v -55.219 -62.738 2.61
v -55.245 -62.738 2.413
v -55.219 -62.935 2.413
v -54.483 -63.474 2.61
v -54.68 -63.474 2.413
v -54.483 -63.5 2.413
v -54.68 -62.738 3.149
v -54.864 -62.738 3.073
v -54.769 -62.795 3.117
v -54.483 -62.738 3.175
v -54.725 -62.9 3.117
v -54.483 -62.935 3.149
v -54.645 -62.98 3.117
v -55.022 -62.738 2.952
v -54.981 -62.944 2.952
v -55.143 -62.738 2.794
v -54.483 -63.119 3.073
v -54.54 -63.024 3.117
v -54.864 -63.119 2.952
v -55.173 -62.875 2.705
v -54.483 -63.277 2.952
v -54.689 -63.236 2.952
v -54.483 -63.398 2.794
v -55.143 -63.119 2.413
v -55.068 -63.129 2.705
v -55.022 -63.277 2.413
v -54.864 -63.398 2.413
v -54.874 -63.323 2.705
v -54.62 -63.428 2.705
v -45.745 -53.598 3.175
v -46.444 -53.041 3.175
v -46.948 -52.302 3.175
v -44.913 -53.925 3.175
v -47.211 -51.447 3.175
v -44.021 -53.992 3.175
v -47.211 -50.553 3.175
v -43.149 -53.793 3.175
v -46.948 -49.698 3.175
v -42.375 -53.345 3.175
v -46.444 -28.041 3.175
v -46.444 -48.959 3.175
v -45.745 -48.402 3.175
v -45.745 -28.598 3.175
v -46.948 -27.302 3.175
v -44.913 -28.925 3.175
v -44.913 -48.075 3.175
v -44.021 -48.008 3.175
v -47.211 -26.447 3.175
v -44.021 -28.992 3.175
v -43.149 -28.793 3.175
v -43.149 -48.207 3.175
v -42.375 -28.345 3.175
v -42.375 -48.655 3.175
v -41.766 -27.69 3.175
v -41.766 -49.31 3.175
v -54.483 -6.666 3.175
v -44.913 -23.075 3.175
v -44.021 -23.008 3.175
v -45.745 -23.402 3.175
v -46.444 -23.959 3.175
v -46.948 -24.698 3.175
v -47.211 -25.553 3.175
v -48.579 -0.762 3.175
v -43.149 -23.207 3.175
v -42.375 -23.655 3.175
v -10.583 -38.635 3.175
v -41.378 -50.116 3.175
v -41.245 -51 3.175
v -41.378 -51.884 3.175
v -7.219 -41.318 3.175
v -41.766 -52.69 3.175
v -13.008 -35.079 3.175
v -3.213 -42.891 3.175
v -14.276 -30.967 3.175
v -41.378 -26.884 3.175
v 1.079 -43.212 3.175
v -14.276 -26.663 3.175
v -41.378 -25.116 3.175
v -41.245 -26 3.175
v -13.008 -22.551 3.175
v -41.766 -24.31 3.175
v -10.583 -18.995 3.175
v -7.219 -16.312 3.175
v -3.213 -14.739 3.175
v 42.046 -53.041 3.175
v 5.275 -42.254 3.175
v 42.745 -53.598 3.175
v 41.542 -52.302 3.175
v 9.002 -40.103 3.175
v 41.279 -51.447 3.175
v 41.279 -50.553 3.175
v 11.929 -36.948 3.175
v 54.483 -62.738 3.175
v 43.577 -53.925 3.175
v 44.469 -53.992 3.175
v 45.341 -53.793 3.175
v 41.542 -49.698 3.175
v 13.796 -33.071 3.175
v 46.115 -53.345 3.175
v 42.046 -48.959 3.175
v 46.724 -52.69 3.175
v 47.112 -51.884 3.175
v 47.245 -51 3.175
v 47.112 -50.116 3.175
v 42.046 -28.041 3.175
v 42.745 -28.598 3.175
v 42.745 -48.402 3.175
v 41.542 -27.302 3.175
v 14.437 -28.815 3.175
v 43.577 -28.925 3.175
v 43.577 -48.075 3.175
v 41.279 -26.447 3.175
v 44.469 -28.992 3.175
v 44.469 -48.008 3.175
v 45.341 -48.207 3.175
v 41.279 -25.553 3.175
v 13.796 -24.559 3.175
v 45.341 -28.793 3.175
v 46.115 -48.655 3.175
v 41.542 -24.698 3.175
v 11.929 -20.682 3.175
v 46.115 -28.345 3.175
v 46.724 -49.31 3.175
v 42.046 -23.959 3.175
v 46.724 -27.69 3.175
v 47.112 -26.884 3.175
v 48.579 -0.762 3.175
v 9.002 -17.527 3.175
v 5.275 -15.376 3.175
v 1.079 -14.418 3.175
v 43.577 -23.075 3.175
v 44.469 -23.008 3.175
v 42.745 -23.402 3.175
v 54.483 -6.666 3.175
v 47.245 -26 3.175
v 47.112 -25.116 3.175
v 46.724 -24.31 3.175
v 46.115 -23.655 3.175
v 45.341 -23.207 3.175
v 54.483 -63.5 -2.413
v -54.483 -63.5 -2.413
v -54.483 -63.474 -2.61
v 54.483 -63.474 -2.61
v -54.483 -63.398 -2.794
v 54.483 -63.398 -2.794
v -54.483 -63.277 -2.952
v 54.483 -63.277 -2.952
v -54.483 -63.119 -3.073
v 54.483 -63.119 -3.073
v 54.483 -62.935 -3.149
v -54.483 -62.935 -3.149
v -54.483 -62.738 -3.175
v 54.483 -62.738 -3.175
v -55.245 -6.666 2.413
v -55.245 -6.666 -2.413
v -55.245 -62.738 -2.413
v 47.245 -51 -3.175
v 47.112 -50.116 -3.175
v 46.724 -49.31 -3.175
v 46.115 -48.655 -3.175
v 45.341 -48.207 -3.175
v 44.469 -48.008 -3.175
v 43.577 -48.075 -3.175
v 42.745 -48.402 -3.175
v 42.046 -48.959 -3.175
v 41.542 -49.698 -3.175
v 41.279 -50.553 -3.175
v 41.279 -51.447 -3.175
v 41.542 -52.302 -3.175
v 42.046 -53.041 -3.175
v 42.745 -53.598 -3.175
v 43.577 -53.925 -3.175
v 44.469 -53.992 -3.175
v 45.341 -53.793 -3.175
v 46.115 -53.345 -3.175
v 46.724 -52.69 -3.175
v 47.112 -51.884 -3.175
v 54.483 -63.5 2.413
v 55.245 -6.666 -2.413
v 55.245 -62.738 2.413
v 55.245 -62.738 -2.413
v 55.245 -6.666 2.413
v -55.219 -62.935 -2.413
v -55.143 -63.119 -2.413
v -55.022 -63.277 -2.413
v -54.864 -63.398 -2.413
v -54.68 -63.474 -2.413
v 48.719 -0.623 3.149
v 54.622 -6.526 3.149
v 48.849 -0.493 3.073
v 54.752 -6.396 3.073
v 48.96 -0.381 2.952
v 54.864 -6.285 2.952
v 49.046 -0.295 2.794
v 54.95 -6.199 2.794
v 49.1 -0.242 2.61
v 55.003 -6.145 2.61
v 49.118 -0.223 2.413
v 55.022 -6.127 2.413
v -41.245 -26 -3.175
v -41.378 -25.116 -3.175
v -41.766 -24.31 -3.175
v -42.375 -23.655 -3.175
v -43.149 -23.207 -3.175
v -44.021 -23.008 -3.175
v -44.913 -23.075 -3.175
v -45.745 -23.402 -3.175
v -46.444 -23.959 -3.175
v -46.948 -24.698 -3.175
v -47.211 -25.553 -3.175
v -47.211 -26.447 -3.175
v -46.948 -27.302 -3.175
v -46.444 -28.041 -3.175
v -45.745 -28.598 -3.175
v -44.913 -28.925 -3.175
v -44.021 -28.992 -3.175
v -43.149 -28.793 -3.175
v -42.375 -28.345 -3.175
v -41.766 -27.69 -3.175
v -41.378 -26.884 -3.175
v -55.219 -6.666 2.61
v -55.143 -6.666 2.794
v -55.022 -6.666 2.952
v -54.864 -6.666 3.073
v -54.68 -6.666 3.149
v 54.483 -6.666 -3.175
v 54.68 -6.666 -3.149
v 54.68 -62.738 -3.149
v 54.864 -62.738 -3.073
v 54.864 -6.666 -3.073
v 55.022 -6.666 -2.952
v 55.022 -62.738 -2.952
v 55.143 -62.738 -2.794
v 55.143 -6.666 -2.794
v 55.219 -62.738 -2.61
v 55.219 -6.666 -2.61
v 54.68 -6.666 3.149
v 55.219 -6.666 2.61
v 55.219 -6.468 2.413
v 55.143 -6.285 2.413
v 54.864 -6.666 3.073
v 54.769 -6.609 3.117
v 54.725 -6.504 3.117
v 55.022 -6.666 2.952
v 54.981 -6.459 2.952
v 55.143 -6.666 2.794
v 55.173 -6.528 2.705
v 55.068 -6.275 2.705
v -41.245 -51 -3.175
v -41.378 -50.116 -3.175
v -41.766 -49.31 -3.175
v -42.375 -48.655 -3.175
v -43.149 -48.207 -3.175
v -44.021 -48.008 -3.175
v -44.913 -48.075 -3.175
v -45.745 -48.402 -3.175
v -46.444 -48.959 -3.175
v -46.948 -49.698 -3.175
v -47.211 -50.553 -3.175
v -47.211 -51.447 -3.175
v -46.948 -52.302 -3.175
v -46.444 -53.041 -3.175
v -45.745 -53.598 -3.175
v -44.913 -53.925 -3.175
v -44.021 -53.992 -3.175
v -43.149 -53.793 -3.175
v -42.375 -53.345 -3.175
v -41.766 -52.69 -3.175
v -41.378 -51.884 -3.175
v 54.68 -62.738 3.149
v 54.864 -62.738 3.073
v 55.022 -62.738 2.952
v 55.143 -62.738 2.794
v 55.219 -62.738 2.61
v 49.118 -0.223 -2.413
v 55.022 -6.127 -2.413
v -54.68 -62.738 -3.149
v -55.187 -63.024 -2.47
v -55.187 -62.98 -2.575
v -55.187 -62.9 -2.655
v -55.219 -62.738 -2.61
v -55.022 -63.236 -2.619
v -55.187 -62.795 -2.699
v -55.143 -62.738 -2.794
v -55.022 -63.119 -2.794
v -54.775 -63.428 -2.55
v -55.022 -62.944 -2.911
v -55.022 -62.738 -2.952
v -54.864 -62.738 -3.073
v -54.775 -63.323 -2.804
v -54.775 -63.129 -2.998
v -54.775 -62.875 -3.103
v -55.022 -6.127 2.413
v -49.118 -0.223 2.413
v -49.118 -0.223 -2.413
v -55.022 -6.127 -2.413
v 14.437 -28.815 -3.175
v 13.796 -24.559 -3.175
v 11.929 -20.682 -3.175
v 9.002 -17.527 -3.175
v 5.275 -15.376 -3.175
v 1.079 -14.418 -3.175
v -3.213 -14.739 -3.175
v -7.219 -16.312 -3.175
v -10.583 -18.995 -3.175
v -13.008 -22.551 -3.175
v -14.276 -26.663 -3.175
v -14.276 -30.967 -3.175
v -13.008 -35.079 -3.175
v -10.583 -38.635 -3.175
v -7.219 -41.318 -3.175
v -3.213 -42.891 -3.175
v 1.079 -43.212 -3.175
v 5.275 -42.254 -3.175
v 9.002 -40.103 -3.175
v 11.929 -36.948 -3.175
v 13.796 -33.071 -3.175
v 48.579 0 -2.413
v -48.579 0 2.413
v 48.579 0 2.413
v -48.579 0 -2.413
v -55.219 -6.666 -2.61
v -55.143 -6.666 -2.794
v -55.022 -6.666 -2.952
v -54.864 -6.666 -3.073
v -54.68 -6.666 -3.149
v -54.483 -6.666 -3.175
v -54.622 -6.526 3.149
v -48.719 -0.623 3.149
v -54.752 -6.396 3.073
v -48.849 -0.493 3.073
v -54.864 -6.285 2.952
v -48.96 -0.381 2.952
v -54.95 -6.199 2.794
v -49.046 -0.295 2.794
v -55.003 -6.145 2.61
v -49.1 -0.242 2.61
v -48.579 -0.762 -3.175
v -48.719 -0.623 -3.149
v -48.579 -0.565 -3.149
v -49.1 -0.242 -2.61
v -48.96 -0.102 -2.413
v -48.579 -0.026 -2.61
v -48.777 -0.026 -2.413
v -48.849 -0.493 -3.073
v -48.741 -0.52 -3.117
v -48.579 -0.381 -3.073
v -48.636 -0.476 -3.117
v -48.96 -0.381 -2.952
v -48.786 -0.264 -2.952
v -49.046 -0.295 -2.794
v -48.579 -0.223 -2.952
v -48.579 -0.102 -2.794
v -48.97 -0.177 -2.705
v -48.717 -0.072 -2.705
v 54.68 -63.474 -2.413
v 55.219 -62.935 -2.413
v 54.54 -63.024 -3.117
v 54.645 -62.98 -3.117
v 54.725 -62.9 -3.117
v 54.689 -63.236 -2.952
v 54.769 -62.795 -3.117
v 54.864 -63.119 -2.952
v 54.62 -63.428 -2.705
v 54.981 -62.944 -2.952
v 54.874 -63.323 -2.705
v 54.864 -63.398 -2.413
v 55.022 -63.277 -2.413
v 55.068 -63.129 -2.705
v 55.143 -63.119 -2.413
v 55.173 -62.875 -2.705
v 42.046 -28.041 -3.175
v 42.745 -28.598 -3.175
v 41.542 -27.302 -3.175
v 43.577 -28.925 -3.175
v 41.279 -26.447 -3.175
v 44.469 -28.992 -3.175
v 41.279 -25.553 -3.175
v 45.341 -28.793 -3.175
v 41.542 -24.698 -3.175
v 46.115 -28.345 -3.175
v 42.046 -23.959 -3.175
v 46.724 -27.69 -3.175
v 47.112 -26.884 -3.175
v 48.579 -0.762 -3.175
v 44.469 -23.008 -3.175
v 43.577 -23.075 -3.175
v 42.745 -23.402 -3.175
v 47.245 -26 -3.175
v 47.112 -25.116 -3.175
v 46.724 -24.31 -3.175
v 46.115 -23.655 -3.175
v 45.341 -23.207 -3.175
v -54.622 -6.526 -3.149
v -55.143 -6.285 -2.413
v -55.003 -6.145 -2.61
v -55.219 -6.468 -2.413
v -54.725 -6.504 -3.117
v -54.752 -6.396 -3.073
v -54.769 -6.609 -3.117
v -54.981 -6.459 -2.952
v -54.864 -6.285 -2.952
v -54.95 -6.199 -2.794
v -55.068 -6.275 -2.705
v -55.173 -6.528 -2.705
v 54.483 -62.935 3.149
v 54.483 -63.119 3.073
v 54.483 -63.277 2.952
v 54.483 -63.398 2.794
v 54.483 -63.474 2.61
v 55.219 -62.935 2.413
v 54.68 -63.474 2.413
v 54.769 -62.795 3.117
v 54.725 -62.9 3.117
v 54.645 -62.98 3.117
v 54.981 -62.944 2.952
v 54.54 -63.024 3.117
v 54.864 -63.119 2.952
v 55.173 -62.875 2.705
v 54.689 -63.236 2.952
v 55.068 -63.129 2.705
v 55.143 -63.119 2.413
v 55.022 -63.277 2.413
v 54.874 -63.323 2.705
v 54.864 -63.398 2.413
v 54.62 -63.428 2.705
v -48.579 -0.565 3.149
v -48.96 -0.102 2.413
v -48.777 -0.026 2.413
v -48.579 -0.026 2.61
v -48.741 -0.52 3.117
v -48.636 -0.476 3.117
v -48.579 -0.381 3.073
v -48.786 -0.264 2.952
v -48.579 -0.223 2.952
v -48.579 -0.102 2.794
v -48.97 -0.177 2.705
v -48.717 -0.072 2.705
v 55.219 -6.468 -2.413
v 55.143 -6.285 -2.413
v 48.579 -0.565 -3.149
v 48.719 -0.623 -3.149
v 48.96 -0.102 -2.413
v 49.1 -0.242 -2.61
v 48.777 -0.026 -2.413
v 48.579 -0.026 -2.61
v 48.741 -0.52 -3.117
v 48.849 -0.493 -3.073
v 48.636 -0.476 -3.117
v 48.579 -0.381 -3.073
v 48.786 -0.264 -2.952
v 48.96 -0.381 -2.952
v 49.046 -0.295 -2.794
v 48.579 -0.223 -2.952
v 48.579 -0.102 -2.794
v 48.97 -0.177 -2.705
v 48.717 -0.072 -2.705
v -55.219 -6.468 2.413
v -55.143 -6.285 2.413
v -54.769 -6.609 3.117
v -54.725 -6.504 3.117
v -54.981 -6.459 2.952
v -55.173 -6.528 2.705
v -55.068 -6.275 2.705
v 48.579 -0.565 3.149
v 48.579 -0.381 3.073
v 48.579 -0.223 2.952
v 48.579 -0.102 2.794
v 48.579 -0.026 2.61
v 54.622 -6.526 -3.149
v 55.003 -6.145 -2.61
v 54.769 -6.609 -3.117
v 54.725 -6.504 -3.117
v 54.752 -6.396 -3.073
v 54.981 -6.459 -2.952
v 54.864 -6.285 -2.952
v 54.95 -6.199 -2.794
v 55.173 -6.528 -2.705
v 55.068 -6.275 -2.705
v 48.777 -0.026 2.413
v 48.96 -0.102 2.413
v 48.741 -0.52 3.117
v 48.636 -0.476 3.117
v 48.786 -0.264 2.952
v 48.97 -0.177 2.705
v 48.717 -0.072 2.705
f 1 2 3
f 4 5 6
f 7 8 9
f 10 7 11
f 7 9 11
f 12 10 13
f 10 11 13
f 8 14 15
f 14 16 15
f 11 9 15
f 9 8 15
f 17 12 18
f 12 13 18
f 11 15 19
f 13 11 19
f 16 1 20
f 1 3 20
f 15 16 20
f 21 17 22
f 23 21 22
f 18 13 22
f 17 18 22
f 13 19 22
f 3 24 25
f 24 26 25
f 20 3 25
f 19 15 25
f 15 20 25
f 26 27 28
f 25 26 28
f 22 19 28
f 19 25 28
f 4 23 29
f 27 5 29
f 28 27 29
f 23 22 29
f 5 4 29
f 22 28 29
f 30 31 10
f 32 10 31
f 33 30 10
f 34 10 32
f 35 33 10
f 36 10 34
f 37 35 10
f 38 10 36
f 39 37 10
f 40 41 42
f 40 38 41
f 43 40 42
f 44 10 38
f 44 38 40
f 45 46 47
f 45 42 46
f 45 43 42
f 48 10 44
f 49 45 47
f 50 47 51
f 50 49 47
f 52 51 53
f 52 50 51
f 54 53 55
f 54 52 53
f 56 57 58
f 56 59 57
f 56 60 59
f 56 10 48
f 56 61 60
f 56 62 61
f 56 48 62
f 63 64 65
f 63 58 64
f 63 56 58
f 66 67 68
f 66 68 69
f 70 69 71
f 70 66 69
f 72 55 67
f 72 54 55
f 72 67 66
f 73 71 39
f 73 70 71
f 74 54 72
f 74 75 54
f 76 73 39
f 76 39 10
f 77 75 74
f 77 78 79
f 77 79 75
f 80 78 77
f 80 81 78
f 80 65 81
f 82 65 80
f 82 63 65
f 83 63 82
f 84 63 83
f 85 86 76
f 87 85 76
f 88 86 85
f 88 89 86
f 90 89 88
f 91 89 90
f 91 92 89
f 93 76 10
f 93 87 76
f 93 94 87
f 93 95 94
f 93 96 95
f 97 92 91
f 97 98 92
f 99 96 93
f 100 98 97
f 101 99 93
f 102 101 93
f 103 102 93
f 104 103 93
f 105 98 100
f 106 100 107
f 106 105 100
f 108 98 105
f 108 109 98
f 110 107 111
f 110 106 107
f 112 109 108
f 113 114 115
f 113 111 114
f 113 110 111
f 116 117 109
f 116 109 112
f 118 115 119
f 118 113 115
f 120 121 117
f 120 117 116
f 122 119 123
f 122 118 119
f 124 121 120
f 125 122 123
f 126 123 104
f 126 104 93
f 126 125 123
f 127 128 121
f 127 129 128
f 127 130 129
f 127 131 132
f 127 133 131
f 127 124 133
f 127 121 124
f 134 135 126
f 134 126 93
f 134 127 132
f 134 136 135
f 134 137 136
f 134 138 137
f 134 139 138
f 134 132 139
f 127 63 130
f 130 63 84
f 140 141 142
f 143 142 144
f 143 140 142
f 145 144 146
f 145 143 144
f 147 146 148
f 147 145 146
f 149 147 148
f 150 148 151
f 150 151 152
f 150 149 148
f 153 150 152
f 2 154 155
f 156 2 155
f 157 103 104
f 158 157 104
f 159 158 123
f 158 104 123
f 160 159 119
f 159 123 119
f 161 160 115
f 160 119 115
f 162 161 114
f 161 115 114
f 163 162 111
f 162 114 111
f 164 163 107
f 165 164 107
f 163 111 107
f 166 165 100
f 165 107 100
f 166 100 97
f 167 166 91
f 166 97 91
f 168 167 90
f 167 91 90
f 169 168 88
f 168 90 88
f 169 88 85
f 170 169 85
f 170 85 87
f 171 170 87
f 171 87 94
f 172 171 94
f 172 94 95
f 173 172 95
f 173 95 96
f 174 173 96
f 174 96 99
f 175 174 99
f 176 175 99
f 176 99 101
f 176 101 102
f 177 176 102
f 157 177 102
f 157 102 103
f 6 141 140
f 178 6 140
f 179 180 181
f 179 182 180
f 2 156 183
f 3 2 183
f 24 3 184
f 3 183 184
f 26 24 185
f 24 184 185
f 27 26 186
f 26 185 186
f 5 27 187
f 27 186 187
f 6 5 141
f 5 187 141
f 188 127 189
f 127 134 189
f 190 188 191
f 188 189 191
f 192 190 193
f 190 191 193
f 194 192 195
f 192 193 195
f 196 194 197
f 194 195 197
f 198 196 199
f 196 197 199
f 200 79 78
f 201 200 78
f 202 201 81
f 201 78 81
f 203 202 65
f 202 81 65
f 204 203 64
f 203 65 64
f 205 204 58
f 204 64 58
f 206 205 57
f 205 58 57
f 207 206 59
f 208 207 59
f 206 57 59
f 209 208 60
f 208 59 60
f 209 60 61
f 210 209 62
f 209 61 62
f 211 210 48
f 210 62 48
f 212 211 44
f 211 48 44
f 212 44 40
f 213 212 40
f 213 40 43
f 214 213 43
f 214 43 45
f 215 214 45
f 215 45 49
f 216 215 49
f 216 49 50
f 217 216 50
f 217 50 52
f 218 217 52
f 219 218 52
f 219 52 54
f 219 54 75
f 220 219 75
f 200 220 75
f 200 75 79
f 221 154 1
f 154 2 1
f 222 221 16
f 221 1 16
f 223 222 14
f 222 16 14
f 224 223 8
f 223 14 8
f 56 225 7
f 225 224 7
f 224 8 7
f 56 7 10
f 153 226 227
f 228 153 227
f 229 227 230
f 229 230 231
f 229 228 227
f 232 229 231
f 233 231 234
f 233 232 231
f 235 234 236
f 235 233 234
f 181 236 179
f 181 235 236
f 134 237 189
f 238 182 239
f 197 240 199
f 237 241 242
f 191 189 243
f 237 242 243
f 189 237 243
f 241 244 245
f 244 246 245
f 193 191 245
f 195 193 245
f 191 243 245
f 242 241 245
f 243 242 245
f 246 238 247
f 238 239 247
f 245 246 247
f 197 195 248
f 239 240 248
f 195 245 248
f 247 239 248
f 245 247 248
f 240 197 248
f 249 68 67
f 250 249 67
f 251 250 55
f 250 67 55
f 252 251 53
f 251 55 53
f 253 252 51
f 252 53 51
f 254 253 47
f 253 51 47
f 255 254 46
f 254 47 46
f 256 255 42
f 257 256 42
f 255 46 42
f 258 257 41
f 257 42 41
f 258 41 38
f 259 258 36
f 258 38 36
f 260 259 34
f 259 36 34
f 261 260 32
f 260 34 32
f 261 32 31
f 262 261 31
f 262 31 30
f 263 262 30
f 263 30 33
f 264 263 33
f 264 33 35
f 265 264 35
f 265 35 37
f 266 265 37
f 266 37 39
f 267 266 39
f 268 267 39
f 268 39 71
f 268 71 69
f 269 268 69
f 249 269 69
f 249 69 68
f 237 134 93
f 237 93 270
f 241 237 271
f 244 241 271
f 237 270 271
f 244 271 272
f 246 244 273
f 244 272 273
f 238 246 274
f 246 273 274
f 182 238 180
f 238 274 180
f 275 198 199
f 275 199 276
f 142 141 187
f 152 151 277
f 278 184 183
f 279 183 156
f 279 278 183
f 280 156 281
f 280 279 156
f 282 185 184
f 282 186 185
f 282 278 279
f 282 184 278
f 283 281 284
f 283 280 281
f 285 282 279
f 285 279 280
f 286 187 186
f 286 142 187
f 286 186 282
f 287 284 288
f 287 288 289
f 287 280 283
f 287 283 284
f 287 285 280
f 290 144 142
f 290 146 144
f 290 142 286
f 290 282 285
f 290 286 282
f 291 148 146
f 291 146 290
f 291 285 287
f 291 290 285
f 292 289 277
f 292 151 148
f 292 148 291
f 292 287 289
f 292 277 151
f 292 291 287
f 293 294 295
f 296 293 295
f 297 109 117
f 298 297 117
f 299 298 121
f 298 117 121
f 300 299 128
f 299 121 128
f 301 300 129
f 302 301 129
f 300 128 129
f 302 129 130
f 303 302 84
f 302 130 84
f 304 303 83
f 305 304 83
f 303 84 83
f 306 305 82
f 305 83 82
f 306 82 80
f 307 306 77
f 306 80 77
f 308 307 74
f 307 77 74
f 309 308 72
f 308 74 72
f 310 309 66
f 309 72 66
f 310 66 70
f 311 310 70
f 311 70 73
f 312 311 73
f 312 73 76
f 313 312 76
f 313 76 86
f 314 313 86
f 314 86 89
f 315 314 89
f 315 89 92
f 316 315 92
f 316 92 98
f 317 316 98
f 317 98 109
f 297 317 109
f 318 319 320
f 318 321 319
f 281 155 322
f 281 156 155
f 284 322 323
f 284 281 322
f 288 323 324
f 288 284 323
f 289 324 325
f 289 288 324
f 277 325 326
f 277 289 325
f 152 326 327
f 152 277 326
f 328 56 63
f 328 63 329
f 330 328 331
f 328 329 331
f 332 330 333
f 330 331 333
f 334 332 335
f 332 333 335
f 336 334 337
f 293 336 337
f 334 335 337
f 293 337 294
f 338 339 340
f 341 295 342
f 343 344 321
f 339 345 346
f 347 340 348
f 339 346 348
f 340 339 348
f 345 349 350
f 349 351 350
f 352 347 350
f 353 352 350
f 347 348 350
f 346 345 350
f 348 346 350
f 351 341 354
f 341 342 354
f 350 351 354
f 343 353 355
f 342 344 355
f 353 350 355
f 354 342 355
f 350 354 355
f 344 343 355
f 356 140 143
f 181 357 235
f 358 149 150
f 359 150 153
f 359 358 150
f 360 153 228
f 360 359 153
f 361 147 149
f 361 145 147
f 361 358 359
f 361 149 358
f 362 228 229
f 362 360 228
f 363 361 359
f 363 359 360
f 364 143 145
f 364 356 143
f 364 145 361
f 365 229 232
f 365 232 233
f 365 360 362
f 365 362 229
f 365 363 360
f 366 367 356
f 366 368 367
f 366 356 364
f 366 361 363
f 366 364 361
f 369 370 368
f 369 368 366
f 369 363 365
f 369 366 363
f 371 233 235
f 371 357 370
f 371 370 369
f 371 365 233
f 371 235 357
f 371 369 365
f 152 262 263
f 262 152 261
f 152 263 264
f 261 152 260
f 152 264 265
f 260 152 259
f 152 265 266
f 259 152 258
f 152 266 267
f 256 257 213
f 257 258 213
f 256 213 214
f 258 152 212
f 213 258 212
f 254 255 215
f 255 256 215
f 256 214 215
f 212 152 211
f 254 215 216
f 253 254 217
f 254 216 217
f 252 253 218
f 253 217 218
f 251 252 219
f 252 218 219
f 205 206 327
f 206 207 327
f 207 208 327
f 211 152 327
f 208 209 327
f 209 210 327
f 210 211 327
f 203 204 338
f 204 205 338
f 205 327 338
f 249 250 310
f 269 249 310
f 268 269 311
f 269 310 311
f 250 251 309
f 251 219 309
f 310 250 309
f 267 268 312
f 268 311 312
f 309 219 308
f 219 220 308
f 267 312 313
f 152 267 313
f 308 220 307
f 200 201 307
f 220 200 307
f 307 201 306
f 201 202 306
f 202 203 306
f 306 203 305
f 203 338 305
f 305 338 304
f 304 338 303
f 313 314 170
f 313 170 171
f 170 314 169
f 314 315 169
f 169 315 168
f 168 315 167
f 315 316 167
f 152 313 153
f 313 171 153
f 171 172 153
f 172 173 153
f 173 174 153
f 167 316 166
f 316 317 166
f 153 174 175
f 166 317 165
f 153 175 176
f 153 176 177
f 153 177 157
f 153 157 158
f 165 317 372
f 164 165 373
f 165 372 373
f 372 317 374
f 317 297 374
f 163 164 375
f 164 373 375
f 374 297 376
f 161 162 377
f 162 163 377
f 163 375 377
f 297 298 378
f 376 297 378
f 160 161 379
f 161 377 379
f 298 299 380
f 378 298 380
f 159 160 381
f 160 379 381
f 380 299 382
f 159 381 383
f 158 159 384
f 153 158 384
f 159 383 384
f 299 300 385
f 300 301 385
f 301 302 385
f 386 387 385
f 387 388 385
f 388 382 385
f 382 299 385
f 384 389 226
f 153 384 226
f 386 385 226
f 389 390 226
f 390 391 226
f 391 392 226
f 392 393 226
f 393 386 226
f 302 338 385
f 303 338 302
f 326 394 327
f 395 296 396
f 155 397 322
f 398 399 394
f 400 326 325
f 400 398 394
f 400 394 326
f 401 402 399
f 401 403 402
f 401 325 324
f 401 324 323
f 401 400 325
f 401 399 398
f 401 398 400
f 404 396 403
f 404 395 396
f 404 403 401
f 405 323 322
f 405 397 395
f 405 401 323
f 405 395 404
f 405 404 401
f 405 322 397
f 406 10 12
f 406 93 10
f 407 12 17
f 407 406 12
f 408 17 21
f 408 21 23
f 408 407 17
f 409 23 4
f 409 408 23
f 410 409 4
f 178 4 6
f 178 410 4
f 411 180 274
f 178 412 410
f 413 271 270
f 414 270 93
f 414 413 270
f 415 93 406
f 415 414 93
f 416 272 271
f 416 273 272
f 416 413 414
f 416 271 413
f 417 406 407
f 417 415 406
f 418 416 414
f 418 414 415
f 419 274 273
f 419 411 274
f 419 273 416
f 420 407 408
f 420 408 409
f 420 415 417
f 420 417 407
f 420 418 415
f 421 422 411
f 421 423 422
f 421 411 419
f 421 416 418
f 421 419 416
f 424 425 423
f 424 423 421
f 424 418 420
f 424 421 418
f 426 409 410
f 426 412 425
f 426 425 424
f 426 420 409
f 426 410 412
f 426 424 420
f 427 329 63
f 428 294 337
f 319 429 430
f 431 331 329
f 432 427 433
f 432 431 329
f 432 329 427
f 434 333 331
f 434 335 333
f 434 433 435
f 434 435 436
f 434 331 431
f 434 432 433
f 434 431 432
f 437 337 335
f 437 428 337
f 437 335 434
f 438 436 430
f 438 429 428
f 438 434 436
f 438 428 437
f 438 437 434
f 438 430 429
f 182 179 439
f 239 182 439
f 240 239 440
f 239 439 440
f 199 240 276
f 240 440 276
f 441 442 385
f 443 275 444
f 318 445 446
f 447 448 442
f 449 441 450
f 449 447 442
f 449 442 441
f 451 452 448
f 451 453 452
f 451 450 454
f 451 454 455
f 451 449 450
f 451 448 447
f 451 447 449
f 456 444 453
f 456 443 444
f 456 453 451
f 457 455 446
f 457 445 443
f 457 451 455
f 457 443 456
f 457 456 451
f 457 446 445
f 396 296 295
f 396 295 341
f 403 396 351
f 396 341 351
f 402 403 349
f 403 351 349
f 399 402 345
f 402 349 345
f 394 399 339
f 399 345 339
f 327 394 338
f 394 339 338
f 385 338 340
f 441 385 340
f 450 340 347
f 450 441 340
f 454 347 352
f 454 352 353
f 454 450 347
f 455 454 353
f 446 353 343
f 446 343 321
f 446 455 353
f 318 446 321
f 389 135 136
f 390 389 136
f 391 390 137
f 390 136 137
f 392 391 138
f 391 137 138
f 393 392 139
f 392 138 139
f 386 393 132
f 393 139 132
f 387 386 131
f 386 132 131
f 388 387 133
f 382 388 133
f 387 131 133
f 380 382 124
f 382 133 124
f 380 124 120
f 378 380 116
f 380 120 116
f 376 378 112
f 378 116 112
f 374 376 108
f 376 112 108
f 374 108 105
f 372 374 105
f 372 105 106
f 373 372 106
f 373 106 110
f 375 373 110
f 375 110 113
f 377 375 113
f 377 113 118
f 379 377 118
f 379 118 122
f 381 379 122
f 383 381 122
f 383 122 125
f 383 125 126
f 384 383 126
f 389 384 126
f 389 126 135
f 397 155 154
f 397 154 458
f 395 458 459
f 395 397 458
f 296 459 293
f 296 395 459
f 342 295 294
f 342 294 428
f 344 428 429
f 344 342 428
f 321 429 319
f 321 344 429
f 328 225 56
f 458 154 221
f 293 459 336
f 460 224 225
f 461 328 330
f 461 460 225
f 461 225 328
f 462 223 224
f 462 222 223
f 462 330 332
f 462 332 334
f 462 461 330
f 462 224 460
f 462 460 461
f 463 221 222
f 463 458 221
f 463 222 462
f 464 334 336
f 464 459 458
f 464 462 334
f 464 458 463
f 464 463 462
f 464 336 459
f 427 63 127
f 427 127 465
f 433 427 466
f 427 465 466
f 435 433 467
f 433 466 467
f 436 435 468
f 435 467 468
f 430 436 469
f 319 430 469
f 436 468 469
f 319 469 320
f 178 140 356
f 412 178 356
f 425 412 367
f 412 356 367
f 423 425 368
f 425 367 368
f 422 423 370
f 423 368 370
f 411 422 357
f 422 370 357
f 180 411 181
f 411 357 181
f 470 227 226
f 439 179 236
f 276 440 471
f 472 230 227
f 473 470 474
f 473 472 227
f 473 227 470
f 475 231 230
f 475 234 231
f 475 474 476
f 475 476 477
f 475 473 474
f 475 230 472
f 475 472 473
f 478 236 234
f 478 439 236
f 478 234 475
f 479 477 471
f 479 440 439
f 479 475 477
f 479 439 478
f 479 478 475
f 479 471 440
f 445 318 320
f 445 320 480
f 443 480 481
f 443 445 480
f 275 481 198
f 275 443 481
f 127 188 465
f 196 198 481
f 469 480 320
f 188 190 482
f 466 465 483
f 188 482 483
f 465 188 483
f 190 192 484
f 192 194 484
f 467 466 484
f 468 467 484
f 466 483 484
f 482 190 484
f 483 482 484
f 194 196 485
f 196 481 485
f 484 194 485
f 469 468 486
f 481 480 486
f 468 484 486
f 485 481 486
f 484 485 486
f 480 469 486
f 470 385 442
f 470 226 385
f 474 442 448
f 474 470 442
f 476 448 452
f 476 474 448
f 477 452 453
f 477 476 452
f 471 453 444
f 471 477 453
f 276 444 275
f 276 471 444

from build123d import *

# Parameters (mm, degrees)
SKETCH2_W                   = 110.49
SKETCH2_H                   = 6.35
BOSS_EXTRUDE1_DEPTH         = 63.5
SKETCH3_R                   = 14.437499981
CUT_EXTRUDE1_DEPTH          = 85.407242136
CHAMFER1_SIZE               = 6.35
TAP_DRILL_FOR_M7X1_0_TAP1_D = 6
FILLET2_R                   = 0.762


with BuildPart() as part:
    # Sketch2 → Boss-Extrude1 (new body)
    with BuildSketch(Plane(origin=(0, 0, 0), x_dir=(1, 0, 0), z_dir=(0, 1, 0))):
        Rectangle(SKETCH2_W, SKETCH2_H)
    extrude(amount=-BOSS_EXTRUDE1_DEPTH)

    # Sketch3 → Cut-Extrude1 (cut, through all)
    with BuildSketch(Plane.XY.offset(3.175)):
        with Locations((0, -28.8150046)):
            Circle(SKETCH3_R)
    extrude(amount=-CUT_EXTRUDE1_DEPTH, mode=Mode.SUBTRACT)

    # Chamfer1
    chamfer1_edges = [part.edges().sort_by_distance(p)[0] for p in [
        (55.245, 0, 0),
        (-55.245, 0, 0),
    ]]
    chamfer(chamfer1_edges, length=CHAMFER1_SIZE)

    # Tap Drill for M7x1.0 Tap1 (through all)
    with Locations(Plane(origin=(0, 0, -3.175), x_dir=(-1, 0, 0), z_dir=(0, 0, -1))):
        with Locations((44.245, -26), (44.245, -51), (-44.245, -51), (-44.245, -26)):
            Hole(TAP_DRILL_FOR_M7X1_0_TAP1_D / 2)

    # Fillet2
    fillet2_edges = [part.edges().sort_by_distance(p)[0] for p in [
        (55.245, -63.5, 0),
        (0, -63.5, -3.175),
        (0, 0, 3.175),
        (0, 0, -3.175),
        (48.895, 0, 0),
        (-48.895, 0, 0),
        (52.07, -3.175, 3.175),
        (-52.07, -3.175, 3.175),
        (-55.245, -6.35, 0),
        (52.07, -3.175, -3.175),
        (-52.07, -3.175, -3.175),
        (55.245, -6.35, 0),
        (-55.245, -63.5, 0),
        (-55.245, -34.925, -3.175),
        (55.245, -34.925, -3.175),
        (55.245, -34.925, 3.175),
        (-55.245, -34.925, 3.175),
        (0, -63.5, 3.175),
    ]]
    fillet(fillet2_edges, radius=FILLET2_R)


solid = part.part
